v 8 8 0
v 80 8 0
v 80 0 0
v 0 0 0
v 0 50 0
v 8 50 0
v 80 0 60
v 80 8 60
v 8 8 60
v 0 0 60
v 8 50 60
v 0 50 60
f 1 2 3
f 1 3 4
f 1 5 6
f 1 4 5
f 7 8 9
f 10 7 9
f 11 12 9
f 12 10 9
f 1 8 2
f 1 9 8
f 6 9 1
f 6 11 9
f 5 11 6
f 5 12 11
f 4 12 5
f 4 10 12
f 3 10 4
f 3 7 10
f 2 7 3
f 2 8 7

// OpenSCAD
$fn = 32;

// ----------------------------------------------------------------------
// Structural section: angle 80 x 50 mm
// ----------------------------------------------------------------------

// --- parameters (mm) ---
sec_w = 80;               // leg width, X
sec_h = 50;               // leg height, Y
flange_t = 8;             // leg thickness
plate_t = 60;             // cut length, Z (extrusion height)

profile = [[0, 0], [80, 0], [80, 8], [8, 8], [8, 50], [0, 50]];  // primary outline, 6 points, counter clockwise

// --- the one profile operation ---
linear_extrude(height = plate_t) polygon(points = profile);
